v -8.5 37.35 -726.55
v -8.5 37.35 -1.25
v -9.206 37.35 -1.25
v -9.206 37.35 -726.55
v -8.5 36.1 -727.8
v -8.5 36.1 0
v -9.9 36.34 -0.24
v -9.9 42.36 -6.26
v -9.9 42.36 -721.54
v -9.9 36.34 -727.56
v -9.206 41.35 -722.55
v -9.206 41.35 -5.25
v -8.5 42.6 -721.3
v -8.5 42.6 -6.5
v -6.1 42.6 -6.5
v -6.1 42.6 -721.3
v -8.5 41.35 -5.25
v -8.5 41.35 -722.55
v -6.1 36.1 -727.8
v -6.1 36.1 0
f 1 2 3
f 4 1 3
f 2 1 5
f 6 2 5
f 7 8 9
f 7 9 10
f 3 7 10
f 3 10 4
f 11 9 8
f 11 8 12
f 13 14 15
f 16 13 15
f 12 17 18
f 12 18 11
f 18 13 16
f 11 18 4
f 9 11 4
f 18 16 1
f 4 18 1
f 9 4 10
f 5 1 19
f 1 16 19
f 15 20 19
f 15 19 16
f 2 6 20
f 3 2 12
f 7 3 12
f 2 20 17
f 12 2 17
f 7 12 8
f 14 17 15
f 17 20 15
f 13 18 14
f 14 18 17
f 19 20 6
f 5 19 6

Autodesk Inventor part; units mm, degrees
ref_plane "YZ Plane" through (0, 0, 0) normal (1, 0, 0) x (0, 1, 0)
ref_plane "XZ Plane" through (0, 0, 0) normal (0, 1, 0) x (-1, 0, 0)
sketch "Sketch1" plane through (0, 0, 0) normal (0, 0, 1) x (1, 0, 0)
  line L0 (-8.5, 42.6) -> (-6.1, 42.6)
  line L1 (-6.1, 36.1) -> (-8.5, 36.1)
  line L2 (-6.1, 36.1) -> (-6.1, 42.6)
  line L3 (-8.5, 37.35) -> (-8.5, 36.1)
  line L4 (-8.5, 41.35) -> (-8.5, 42.6)
  line L5 (-8.5, 37.35) -> (-9.2058, 37.35)
  line L6 (-8.5, 41.35) -> (-9.2058, 41.35)
  line L7 (-9.9, 42.36) -> (-9.2058, 41.35)
  line L8 (-9.9, 36.34) -> (-9.2058, 37.35)
  line L9 (-9.9, 42.36) -> (-9.9, 36.34)
  point P0 (-8.5, 41.975)
  point P1 (-6.1, 39.35)
  dimension "d27" = 6.5
  dimension "d28" = 2.4
  dimension "d29" = 2.4
  dimension "d35" = 111
  dimension "d36" = 4
  dimension "d37" = 6.02
  dimension "d38" = 0.7058
  dimension "d39" = 0.7058
  dimension "d43" = 3.01
  dimension "d44" = 2
extrude "Extrusion1" add sketch "Sketch1" against normal blind 727.8
ref_plane "Plano de trabajo3" through (0, 0, -363.9) normal (0, 0, 1) x (1, 0, 0)
sketch "Boceto2" plane through (-6.1, 36.1, 0) normal (1, 0, 0) x (0, 0, -1)
  line L0 (0, 0) -> (6.5, 6.5)
  line L1 (0, 6.5) -> (727.8, 6.5) projected
  line L2 (6.5, 6.5) -> (0, 6.5)
  line L3 (0, 0) -> (0, 6.5)
  line L4 (0, 6.26) -> (0, 0.24) projected
  point P0 (0, -36.1)
  dimension "d60" = 45
extrude "Extrusión2" cut sketch "Boceto2" against normal through all
mirror "Simetría2" about plane through (0, 0, -363.9) normal (0, 0, 1) of "Extrusión2"
properties part number "JUNTA DE GOMA 800MM" material "Rubber"
